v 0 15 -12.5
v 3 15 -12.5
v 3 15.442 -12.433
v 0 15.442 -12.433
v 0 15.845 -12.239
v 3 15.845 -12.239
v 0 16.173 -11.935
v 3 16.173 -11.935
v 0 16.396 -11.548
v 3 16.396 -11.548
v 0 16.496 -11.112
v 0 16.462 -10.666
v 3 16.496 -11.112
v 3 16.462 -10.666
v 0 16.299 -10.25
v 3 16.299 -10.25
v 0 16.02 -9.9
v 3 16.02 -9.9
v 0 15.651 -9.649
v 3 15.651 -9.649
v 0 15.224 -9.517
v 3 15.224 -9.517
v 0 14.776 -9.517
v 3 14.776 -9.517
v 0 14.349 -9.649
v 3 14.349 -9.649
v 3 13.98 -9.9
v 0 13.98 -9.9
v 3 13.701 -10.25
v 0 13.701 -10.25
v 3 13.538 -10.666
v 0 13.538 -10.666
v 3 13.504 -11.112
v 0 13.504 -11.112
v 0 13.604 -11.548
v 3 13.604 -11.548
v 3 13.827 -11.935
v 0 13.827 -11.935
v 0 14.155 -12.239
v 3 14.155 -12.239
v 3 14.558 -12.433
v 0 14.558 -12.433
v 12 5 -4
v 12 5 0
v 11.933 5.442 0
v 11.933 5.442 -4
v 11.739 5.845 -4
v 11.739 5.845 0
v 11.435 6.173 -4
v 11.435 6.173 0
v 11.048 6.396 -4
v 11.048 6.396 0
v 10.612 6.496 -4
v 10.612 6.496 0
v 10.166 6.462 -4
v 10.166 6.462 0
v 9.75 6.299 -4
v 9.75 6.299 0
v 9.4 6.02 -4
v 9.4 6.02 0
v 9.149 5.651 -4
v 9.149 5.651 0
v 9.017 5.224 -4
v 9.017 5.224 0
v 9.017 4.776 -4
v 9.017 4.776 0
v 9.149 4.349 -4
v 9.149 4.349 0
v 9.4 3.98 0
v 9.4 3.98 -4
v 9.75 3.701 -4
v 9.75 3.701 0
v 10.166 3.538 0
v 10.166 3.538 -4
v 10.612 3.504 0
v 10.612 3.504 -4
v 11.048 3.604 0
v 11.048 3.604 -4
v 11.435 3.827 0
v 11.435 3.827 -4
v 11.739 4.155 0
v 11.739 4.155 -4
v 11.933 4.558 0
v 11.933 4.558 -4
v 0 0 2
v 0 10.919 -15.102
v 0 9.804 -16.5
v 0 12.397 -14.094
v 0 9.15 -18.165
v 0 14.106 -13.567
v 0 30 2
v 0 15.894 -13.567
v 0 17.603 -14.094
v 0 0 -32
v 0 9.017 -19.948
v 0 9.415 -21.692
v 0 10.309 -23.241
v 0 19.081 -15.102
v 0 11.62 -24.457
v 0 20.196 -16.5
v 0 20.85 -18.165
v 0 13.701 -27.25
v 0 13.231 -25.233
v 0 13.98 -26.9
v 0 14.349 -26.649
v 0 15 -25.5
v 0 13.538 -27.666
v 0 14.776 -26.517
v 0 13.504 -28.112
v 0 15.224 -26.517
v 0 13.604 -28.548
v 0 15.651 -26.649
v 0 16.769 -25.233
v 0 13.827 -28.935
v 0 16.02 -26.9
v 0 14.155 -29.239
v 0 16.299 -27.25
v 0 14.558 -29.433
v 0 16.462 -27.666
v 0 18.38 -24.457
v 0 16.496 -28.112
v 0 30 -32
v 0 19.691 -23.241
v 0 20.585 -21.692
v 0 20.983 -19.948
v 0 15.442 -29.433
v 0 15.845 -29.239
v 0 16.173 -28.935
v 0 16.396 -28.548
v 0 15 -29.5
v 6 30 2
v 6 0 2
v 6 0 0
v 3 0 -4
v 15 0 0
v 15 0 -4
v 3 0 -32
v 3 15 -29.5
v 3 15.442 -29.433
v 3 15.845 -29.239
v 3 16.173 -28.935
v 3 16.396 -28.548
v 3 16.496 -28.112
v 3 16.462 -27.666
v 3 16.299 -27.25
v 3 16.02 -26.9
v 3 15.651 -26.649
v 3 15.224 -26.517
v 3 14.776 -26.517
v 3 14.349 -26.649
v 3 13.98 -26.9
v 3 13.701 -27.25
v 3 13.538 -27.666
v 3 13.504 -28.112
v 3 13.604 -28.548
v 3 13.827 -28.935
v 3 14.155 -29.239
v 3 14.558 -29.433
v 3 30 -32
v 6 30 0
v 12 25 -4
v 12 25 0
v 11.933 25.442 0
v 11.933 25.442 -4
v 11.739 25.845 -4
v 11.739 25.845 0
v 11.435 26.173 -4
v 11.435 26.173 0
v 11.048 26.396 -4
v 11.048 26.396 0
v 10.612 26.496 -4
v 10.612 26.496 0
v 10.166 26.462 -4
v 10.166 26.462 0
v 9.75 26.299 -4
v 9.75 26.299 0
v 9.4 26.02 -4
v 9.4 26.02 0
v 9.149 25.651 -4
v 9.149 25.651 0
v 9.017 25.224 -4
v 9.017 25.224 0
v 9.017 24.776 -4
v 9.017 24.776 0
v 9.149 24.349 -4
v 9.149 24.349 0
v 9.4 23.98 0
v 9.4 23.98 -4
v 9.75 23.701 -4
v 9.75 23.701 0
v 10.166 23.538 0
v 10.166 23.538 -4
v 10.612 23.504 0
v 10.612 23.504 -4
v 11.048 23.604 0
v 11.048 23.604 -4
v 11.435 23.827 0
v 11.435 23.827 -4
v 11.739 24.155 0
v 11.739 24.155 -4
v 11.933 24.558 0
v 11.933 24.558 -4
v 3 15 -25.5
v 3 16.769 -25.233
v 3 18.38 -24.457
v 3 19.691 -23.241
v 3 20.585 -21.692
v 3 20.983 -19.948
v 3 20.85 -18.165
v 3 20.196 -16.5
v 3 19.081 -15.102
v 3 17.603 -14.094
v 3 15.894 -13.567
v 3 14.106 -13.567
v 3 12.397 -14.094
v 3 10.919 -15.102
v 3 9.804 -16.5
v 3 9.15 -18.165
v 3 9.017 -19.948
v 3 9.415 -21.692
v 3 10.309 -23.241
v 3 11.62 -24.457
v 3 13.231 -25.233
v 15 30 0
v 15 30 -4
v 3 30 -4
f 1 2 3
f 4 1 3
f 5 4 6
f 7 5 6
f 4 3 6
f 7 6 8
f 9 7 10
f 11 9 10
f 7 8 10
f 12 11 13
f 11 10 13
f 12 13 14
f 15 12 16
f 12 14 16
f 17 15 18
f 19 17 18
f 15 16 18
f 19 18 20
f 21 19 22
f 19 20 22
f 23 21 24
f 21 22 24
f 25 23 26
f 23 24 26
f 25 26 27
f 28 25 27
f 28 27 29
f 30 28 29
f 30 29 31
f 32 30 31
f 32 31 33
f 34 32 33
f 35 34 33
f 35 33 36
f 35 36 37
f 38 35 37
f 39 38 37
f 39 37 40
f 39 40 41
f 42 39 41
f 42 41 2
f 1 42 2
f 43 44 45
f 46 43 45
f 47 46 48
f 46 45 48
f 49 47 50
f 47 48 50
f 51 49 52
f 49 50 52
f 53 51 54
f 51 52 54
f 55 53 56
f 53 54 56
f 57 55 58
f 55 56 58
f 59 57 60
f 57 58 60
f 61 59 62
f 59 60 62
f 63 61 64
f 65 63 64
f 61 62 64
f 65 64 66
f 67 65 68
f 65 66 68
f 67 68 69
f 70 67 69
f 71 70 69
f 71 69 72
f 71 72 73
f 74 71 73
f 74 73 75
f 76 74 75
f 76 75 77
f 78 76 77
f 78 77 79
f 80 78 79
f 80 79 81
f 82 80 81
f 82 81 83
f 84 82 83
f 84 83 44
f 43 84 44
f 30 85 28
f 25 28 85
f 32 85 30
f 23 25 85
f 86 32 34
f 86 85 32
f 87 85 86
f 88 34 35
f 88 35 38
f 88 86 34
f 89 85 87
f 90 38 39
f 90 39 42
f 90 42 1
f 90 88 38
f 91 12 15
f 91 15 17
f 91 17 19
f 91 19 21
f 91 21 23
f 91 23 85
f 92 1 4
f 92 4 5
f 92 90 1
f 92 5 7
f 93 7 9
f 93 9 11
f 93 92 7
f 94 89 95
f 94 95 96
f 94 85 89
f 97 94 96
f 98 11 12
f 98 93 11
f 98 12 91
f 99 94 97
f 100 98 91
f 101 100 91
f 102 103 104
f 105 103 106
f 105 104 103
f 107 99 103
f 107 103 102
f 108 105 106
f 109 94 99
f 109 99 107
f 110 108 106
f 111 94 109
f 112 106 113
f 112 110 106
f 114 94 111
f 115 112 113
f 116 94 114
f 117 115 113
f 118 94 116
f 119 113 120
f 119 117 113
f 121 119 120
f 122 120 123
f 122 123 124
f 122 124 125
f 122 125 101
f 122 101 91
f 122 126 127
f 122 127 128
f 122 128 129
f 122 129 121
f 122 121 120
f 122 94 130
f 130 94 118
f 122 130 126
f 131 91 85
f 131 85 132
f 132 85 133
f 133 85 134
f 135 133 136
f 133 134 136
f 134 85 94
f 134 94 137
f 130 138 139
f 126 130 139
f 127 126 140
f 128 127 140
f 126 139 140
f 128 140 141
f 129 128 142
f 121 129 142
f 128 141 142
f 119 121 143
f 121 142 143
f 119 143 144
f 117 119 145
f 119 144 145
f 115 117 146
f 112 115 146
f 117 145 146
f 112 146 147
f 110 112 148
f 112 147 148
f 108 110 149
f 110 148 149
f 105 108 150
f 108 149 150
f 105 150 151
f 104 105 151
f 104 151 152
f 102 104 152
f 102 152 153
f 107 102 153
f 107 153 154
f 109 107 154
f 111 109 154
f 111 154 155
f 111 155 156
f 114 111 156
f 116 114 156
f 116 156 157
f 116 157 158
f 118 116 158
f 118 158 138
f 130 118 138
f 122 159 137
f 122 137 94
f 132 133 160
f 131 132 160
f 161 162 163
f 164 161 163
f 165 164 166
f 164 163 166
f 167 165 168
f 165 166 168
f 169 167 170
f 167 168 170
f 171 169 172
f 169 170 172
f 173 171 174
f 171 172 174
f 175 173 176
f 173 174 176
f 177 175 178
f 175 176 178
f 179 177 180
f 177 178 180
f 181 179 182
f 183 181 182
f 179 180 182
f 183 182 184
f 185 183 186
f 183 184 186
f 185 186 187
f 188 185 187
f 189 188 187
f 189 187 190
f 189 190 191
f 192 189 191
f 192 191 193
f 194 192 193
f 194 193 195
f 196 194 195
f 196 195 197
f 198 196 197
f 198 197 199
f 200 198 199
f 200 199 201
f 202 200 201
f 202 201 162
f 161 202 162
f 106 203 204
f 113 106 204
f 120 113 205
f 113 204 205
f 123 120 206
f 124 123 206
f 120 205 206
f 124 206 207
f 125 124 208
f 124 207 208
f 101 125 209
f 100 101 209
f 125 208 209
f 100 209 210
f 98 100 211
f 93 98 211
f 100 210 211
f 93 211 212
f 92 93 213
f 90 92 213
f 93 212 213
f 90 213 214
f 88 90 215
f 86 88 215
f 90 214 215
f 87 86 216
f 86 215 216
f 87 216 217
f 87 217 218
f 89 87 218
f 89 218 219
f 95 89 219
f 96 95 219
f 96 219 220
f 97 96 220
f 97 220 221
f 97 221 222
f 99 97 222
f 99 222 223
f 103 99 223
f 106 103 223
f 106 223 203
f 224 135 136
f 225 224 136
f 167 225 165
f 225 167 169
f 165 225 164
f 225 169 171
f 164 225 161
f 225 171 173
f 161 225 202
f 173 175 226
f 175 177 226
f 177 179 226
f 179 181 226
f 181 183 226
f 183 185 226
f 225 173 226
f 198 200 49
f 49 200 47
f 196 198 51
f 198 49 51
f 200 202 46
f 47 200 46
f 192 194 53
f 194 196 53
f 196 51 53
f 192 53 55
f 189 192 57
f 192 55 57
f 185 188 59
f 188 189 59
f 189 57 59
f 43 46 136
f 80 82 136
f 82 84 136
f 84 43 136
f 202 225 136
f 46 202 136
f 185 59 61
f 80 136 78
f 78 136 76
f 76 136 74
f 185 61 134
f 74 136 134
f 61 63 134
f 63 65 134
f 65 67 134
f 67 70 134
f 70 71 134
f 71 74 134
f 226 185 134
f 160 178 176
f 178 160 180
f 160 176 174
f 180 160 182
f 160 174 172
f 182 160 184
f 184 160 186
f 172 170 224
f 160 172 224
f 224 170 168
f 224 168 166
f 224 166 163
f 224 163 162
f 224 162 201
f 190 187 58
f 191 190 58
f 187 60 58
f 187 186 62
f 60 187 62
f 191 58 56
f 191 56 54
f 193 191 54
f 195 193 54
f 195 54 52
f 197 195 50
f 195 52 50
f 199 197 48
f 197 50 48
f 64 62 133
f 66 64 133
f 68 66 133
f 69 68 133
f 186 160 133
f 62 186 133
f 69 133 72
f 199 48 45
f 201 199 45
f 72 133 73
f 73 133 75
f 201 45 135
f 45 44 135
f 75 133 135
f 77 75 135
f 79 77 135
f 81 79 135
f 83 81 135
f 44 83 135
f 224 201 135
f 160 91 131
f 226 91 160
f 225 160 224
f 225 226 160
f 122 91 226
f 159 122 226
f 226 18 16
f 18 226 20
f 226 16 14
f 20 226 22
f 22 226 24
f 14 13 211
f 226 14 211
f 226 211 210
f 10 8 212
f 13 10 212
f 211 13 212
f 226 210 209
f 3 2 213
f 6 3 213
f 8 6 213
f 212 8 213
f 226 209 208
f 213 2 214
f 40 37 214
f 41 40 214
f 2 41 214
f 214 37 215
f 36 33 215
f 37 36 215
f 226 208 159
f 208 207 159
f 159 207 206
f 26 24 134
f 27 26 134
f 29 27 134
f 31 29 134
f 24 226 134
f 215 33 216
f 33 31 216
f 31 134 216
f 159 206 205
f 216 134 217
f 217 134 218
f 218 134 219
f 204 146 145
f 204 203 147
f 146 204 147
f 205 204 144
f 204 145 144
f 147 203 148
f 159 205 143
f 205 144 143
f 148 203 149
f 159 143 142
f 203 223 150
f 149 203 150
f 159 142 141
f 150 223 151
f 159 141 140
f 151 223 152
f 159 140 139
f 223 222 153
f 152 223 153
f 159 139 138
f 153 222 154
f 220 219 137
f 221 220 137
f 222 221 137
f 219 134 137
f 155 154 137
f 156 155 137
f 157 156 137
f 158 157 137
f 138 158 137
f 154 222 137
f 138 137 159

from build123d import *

# Parameters (mm, degrees)
EXTRUDE_1_DEPTH     = 30
SKETCH_2_R          = 6
CUT_EXTRUDE_1_DEPTH = 26
SKETCH_3_W          = 6
SKETCH_3_H          = 30
EXTRUDE_2_DEPTH     = 2
SKETCH_4_R          = 1.5
CUT_EXTRUDE_2_DEPTH = 46.475268004
SKETCH_5_R          = 1.5
CUT_EXTRUDE_3_DEPTH = 47.357307946


with BuildPart() as part:
    # 草图1 → 凸台-拉伸1 (new body)
    with BuildSketch(Plane(origin=(0, 0, 0), x_dir=(1, 0, 0), z_dir=(0, 1, 0))):
        Polygon((0, 0), (15, 0), (15, 4), (3, 4), (3, 32), (0, 32), align=None)
    extrude(amount=EXTRUDE_1_DEPTH)

    # 草图2 → 切除-拉伸1 (cut)
    with BuildSketch(Plane(origin=(3, 0, 0), x_dir=(0, 0, -1), z_dir=(1, 0, 0))):
        with Locations((19.5, 15)):
            Circle(SKETCH_2_R)
    extrude(amount=-CUT_EXTRUDE_1_DEPTH, mode=Mode.SUBTRACT)

    # 草图3 → 凸台-拉伸2 (add)
    with BuildSketch(Plane.XY):
        with Locations((3, 15)):
            Rectangle(SKETCH_3_W, SKETCH_3_H)
    extrude(amount=EXTRUDE_2_DEPTH)

    # 草图4 → 切除-拉伸2 (cut, through all)
    with BuildSketch(Plane(origin=(3, 0, 0), x_dir=(0, 0, -1), z_dir=(1, 0, 0))):
        with Locations((28, 15)):
            Circle(SKETCH_4_R)
        with Locations((11, 15)):
            Circle(SKETCH_4_R)
    extrude(amount=-CUT_EXTRUDE_2_DEPTH, mode=Mode.SUBTRACT)

    # 草图5 → 切除-拉伸3 (cut, through all)
    with BuildSketch(Plane.XY):
        with Locations((10.5, 25)):
            Circle(SKETCH_5_R)
        with Locations((10.5, 5)):
            Circle(SKETCH_5_R)
    extrude(amount=-CUT_EXTRUDE_3_DEPTH, mode=Mode.SUBTRACT)


solid = part.part
